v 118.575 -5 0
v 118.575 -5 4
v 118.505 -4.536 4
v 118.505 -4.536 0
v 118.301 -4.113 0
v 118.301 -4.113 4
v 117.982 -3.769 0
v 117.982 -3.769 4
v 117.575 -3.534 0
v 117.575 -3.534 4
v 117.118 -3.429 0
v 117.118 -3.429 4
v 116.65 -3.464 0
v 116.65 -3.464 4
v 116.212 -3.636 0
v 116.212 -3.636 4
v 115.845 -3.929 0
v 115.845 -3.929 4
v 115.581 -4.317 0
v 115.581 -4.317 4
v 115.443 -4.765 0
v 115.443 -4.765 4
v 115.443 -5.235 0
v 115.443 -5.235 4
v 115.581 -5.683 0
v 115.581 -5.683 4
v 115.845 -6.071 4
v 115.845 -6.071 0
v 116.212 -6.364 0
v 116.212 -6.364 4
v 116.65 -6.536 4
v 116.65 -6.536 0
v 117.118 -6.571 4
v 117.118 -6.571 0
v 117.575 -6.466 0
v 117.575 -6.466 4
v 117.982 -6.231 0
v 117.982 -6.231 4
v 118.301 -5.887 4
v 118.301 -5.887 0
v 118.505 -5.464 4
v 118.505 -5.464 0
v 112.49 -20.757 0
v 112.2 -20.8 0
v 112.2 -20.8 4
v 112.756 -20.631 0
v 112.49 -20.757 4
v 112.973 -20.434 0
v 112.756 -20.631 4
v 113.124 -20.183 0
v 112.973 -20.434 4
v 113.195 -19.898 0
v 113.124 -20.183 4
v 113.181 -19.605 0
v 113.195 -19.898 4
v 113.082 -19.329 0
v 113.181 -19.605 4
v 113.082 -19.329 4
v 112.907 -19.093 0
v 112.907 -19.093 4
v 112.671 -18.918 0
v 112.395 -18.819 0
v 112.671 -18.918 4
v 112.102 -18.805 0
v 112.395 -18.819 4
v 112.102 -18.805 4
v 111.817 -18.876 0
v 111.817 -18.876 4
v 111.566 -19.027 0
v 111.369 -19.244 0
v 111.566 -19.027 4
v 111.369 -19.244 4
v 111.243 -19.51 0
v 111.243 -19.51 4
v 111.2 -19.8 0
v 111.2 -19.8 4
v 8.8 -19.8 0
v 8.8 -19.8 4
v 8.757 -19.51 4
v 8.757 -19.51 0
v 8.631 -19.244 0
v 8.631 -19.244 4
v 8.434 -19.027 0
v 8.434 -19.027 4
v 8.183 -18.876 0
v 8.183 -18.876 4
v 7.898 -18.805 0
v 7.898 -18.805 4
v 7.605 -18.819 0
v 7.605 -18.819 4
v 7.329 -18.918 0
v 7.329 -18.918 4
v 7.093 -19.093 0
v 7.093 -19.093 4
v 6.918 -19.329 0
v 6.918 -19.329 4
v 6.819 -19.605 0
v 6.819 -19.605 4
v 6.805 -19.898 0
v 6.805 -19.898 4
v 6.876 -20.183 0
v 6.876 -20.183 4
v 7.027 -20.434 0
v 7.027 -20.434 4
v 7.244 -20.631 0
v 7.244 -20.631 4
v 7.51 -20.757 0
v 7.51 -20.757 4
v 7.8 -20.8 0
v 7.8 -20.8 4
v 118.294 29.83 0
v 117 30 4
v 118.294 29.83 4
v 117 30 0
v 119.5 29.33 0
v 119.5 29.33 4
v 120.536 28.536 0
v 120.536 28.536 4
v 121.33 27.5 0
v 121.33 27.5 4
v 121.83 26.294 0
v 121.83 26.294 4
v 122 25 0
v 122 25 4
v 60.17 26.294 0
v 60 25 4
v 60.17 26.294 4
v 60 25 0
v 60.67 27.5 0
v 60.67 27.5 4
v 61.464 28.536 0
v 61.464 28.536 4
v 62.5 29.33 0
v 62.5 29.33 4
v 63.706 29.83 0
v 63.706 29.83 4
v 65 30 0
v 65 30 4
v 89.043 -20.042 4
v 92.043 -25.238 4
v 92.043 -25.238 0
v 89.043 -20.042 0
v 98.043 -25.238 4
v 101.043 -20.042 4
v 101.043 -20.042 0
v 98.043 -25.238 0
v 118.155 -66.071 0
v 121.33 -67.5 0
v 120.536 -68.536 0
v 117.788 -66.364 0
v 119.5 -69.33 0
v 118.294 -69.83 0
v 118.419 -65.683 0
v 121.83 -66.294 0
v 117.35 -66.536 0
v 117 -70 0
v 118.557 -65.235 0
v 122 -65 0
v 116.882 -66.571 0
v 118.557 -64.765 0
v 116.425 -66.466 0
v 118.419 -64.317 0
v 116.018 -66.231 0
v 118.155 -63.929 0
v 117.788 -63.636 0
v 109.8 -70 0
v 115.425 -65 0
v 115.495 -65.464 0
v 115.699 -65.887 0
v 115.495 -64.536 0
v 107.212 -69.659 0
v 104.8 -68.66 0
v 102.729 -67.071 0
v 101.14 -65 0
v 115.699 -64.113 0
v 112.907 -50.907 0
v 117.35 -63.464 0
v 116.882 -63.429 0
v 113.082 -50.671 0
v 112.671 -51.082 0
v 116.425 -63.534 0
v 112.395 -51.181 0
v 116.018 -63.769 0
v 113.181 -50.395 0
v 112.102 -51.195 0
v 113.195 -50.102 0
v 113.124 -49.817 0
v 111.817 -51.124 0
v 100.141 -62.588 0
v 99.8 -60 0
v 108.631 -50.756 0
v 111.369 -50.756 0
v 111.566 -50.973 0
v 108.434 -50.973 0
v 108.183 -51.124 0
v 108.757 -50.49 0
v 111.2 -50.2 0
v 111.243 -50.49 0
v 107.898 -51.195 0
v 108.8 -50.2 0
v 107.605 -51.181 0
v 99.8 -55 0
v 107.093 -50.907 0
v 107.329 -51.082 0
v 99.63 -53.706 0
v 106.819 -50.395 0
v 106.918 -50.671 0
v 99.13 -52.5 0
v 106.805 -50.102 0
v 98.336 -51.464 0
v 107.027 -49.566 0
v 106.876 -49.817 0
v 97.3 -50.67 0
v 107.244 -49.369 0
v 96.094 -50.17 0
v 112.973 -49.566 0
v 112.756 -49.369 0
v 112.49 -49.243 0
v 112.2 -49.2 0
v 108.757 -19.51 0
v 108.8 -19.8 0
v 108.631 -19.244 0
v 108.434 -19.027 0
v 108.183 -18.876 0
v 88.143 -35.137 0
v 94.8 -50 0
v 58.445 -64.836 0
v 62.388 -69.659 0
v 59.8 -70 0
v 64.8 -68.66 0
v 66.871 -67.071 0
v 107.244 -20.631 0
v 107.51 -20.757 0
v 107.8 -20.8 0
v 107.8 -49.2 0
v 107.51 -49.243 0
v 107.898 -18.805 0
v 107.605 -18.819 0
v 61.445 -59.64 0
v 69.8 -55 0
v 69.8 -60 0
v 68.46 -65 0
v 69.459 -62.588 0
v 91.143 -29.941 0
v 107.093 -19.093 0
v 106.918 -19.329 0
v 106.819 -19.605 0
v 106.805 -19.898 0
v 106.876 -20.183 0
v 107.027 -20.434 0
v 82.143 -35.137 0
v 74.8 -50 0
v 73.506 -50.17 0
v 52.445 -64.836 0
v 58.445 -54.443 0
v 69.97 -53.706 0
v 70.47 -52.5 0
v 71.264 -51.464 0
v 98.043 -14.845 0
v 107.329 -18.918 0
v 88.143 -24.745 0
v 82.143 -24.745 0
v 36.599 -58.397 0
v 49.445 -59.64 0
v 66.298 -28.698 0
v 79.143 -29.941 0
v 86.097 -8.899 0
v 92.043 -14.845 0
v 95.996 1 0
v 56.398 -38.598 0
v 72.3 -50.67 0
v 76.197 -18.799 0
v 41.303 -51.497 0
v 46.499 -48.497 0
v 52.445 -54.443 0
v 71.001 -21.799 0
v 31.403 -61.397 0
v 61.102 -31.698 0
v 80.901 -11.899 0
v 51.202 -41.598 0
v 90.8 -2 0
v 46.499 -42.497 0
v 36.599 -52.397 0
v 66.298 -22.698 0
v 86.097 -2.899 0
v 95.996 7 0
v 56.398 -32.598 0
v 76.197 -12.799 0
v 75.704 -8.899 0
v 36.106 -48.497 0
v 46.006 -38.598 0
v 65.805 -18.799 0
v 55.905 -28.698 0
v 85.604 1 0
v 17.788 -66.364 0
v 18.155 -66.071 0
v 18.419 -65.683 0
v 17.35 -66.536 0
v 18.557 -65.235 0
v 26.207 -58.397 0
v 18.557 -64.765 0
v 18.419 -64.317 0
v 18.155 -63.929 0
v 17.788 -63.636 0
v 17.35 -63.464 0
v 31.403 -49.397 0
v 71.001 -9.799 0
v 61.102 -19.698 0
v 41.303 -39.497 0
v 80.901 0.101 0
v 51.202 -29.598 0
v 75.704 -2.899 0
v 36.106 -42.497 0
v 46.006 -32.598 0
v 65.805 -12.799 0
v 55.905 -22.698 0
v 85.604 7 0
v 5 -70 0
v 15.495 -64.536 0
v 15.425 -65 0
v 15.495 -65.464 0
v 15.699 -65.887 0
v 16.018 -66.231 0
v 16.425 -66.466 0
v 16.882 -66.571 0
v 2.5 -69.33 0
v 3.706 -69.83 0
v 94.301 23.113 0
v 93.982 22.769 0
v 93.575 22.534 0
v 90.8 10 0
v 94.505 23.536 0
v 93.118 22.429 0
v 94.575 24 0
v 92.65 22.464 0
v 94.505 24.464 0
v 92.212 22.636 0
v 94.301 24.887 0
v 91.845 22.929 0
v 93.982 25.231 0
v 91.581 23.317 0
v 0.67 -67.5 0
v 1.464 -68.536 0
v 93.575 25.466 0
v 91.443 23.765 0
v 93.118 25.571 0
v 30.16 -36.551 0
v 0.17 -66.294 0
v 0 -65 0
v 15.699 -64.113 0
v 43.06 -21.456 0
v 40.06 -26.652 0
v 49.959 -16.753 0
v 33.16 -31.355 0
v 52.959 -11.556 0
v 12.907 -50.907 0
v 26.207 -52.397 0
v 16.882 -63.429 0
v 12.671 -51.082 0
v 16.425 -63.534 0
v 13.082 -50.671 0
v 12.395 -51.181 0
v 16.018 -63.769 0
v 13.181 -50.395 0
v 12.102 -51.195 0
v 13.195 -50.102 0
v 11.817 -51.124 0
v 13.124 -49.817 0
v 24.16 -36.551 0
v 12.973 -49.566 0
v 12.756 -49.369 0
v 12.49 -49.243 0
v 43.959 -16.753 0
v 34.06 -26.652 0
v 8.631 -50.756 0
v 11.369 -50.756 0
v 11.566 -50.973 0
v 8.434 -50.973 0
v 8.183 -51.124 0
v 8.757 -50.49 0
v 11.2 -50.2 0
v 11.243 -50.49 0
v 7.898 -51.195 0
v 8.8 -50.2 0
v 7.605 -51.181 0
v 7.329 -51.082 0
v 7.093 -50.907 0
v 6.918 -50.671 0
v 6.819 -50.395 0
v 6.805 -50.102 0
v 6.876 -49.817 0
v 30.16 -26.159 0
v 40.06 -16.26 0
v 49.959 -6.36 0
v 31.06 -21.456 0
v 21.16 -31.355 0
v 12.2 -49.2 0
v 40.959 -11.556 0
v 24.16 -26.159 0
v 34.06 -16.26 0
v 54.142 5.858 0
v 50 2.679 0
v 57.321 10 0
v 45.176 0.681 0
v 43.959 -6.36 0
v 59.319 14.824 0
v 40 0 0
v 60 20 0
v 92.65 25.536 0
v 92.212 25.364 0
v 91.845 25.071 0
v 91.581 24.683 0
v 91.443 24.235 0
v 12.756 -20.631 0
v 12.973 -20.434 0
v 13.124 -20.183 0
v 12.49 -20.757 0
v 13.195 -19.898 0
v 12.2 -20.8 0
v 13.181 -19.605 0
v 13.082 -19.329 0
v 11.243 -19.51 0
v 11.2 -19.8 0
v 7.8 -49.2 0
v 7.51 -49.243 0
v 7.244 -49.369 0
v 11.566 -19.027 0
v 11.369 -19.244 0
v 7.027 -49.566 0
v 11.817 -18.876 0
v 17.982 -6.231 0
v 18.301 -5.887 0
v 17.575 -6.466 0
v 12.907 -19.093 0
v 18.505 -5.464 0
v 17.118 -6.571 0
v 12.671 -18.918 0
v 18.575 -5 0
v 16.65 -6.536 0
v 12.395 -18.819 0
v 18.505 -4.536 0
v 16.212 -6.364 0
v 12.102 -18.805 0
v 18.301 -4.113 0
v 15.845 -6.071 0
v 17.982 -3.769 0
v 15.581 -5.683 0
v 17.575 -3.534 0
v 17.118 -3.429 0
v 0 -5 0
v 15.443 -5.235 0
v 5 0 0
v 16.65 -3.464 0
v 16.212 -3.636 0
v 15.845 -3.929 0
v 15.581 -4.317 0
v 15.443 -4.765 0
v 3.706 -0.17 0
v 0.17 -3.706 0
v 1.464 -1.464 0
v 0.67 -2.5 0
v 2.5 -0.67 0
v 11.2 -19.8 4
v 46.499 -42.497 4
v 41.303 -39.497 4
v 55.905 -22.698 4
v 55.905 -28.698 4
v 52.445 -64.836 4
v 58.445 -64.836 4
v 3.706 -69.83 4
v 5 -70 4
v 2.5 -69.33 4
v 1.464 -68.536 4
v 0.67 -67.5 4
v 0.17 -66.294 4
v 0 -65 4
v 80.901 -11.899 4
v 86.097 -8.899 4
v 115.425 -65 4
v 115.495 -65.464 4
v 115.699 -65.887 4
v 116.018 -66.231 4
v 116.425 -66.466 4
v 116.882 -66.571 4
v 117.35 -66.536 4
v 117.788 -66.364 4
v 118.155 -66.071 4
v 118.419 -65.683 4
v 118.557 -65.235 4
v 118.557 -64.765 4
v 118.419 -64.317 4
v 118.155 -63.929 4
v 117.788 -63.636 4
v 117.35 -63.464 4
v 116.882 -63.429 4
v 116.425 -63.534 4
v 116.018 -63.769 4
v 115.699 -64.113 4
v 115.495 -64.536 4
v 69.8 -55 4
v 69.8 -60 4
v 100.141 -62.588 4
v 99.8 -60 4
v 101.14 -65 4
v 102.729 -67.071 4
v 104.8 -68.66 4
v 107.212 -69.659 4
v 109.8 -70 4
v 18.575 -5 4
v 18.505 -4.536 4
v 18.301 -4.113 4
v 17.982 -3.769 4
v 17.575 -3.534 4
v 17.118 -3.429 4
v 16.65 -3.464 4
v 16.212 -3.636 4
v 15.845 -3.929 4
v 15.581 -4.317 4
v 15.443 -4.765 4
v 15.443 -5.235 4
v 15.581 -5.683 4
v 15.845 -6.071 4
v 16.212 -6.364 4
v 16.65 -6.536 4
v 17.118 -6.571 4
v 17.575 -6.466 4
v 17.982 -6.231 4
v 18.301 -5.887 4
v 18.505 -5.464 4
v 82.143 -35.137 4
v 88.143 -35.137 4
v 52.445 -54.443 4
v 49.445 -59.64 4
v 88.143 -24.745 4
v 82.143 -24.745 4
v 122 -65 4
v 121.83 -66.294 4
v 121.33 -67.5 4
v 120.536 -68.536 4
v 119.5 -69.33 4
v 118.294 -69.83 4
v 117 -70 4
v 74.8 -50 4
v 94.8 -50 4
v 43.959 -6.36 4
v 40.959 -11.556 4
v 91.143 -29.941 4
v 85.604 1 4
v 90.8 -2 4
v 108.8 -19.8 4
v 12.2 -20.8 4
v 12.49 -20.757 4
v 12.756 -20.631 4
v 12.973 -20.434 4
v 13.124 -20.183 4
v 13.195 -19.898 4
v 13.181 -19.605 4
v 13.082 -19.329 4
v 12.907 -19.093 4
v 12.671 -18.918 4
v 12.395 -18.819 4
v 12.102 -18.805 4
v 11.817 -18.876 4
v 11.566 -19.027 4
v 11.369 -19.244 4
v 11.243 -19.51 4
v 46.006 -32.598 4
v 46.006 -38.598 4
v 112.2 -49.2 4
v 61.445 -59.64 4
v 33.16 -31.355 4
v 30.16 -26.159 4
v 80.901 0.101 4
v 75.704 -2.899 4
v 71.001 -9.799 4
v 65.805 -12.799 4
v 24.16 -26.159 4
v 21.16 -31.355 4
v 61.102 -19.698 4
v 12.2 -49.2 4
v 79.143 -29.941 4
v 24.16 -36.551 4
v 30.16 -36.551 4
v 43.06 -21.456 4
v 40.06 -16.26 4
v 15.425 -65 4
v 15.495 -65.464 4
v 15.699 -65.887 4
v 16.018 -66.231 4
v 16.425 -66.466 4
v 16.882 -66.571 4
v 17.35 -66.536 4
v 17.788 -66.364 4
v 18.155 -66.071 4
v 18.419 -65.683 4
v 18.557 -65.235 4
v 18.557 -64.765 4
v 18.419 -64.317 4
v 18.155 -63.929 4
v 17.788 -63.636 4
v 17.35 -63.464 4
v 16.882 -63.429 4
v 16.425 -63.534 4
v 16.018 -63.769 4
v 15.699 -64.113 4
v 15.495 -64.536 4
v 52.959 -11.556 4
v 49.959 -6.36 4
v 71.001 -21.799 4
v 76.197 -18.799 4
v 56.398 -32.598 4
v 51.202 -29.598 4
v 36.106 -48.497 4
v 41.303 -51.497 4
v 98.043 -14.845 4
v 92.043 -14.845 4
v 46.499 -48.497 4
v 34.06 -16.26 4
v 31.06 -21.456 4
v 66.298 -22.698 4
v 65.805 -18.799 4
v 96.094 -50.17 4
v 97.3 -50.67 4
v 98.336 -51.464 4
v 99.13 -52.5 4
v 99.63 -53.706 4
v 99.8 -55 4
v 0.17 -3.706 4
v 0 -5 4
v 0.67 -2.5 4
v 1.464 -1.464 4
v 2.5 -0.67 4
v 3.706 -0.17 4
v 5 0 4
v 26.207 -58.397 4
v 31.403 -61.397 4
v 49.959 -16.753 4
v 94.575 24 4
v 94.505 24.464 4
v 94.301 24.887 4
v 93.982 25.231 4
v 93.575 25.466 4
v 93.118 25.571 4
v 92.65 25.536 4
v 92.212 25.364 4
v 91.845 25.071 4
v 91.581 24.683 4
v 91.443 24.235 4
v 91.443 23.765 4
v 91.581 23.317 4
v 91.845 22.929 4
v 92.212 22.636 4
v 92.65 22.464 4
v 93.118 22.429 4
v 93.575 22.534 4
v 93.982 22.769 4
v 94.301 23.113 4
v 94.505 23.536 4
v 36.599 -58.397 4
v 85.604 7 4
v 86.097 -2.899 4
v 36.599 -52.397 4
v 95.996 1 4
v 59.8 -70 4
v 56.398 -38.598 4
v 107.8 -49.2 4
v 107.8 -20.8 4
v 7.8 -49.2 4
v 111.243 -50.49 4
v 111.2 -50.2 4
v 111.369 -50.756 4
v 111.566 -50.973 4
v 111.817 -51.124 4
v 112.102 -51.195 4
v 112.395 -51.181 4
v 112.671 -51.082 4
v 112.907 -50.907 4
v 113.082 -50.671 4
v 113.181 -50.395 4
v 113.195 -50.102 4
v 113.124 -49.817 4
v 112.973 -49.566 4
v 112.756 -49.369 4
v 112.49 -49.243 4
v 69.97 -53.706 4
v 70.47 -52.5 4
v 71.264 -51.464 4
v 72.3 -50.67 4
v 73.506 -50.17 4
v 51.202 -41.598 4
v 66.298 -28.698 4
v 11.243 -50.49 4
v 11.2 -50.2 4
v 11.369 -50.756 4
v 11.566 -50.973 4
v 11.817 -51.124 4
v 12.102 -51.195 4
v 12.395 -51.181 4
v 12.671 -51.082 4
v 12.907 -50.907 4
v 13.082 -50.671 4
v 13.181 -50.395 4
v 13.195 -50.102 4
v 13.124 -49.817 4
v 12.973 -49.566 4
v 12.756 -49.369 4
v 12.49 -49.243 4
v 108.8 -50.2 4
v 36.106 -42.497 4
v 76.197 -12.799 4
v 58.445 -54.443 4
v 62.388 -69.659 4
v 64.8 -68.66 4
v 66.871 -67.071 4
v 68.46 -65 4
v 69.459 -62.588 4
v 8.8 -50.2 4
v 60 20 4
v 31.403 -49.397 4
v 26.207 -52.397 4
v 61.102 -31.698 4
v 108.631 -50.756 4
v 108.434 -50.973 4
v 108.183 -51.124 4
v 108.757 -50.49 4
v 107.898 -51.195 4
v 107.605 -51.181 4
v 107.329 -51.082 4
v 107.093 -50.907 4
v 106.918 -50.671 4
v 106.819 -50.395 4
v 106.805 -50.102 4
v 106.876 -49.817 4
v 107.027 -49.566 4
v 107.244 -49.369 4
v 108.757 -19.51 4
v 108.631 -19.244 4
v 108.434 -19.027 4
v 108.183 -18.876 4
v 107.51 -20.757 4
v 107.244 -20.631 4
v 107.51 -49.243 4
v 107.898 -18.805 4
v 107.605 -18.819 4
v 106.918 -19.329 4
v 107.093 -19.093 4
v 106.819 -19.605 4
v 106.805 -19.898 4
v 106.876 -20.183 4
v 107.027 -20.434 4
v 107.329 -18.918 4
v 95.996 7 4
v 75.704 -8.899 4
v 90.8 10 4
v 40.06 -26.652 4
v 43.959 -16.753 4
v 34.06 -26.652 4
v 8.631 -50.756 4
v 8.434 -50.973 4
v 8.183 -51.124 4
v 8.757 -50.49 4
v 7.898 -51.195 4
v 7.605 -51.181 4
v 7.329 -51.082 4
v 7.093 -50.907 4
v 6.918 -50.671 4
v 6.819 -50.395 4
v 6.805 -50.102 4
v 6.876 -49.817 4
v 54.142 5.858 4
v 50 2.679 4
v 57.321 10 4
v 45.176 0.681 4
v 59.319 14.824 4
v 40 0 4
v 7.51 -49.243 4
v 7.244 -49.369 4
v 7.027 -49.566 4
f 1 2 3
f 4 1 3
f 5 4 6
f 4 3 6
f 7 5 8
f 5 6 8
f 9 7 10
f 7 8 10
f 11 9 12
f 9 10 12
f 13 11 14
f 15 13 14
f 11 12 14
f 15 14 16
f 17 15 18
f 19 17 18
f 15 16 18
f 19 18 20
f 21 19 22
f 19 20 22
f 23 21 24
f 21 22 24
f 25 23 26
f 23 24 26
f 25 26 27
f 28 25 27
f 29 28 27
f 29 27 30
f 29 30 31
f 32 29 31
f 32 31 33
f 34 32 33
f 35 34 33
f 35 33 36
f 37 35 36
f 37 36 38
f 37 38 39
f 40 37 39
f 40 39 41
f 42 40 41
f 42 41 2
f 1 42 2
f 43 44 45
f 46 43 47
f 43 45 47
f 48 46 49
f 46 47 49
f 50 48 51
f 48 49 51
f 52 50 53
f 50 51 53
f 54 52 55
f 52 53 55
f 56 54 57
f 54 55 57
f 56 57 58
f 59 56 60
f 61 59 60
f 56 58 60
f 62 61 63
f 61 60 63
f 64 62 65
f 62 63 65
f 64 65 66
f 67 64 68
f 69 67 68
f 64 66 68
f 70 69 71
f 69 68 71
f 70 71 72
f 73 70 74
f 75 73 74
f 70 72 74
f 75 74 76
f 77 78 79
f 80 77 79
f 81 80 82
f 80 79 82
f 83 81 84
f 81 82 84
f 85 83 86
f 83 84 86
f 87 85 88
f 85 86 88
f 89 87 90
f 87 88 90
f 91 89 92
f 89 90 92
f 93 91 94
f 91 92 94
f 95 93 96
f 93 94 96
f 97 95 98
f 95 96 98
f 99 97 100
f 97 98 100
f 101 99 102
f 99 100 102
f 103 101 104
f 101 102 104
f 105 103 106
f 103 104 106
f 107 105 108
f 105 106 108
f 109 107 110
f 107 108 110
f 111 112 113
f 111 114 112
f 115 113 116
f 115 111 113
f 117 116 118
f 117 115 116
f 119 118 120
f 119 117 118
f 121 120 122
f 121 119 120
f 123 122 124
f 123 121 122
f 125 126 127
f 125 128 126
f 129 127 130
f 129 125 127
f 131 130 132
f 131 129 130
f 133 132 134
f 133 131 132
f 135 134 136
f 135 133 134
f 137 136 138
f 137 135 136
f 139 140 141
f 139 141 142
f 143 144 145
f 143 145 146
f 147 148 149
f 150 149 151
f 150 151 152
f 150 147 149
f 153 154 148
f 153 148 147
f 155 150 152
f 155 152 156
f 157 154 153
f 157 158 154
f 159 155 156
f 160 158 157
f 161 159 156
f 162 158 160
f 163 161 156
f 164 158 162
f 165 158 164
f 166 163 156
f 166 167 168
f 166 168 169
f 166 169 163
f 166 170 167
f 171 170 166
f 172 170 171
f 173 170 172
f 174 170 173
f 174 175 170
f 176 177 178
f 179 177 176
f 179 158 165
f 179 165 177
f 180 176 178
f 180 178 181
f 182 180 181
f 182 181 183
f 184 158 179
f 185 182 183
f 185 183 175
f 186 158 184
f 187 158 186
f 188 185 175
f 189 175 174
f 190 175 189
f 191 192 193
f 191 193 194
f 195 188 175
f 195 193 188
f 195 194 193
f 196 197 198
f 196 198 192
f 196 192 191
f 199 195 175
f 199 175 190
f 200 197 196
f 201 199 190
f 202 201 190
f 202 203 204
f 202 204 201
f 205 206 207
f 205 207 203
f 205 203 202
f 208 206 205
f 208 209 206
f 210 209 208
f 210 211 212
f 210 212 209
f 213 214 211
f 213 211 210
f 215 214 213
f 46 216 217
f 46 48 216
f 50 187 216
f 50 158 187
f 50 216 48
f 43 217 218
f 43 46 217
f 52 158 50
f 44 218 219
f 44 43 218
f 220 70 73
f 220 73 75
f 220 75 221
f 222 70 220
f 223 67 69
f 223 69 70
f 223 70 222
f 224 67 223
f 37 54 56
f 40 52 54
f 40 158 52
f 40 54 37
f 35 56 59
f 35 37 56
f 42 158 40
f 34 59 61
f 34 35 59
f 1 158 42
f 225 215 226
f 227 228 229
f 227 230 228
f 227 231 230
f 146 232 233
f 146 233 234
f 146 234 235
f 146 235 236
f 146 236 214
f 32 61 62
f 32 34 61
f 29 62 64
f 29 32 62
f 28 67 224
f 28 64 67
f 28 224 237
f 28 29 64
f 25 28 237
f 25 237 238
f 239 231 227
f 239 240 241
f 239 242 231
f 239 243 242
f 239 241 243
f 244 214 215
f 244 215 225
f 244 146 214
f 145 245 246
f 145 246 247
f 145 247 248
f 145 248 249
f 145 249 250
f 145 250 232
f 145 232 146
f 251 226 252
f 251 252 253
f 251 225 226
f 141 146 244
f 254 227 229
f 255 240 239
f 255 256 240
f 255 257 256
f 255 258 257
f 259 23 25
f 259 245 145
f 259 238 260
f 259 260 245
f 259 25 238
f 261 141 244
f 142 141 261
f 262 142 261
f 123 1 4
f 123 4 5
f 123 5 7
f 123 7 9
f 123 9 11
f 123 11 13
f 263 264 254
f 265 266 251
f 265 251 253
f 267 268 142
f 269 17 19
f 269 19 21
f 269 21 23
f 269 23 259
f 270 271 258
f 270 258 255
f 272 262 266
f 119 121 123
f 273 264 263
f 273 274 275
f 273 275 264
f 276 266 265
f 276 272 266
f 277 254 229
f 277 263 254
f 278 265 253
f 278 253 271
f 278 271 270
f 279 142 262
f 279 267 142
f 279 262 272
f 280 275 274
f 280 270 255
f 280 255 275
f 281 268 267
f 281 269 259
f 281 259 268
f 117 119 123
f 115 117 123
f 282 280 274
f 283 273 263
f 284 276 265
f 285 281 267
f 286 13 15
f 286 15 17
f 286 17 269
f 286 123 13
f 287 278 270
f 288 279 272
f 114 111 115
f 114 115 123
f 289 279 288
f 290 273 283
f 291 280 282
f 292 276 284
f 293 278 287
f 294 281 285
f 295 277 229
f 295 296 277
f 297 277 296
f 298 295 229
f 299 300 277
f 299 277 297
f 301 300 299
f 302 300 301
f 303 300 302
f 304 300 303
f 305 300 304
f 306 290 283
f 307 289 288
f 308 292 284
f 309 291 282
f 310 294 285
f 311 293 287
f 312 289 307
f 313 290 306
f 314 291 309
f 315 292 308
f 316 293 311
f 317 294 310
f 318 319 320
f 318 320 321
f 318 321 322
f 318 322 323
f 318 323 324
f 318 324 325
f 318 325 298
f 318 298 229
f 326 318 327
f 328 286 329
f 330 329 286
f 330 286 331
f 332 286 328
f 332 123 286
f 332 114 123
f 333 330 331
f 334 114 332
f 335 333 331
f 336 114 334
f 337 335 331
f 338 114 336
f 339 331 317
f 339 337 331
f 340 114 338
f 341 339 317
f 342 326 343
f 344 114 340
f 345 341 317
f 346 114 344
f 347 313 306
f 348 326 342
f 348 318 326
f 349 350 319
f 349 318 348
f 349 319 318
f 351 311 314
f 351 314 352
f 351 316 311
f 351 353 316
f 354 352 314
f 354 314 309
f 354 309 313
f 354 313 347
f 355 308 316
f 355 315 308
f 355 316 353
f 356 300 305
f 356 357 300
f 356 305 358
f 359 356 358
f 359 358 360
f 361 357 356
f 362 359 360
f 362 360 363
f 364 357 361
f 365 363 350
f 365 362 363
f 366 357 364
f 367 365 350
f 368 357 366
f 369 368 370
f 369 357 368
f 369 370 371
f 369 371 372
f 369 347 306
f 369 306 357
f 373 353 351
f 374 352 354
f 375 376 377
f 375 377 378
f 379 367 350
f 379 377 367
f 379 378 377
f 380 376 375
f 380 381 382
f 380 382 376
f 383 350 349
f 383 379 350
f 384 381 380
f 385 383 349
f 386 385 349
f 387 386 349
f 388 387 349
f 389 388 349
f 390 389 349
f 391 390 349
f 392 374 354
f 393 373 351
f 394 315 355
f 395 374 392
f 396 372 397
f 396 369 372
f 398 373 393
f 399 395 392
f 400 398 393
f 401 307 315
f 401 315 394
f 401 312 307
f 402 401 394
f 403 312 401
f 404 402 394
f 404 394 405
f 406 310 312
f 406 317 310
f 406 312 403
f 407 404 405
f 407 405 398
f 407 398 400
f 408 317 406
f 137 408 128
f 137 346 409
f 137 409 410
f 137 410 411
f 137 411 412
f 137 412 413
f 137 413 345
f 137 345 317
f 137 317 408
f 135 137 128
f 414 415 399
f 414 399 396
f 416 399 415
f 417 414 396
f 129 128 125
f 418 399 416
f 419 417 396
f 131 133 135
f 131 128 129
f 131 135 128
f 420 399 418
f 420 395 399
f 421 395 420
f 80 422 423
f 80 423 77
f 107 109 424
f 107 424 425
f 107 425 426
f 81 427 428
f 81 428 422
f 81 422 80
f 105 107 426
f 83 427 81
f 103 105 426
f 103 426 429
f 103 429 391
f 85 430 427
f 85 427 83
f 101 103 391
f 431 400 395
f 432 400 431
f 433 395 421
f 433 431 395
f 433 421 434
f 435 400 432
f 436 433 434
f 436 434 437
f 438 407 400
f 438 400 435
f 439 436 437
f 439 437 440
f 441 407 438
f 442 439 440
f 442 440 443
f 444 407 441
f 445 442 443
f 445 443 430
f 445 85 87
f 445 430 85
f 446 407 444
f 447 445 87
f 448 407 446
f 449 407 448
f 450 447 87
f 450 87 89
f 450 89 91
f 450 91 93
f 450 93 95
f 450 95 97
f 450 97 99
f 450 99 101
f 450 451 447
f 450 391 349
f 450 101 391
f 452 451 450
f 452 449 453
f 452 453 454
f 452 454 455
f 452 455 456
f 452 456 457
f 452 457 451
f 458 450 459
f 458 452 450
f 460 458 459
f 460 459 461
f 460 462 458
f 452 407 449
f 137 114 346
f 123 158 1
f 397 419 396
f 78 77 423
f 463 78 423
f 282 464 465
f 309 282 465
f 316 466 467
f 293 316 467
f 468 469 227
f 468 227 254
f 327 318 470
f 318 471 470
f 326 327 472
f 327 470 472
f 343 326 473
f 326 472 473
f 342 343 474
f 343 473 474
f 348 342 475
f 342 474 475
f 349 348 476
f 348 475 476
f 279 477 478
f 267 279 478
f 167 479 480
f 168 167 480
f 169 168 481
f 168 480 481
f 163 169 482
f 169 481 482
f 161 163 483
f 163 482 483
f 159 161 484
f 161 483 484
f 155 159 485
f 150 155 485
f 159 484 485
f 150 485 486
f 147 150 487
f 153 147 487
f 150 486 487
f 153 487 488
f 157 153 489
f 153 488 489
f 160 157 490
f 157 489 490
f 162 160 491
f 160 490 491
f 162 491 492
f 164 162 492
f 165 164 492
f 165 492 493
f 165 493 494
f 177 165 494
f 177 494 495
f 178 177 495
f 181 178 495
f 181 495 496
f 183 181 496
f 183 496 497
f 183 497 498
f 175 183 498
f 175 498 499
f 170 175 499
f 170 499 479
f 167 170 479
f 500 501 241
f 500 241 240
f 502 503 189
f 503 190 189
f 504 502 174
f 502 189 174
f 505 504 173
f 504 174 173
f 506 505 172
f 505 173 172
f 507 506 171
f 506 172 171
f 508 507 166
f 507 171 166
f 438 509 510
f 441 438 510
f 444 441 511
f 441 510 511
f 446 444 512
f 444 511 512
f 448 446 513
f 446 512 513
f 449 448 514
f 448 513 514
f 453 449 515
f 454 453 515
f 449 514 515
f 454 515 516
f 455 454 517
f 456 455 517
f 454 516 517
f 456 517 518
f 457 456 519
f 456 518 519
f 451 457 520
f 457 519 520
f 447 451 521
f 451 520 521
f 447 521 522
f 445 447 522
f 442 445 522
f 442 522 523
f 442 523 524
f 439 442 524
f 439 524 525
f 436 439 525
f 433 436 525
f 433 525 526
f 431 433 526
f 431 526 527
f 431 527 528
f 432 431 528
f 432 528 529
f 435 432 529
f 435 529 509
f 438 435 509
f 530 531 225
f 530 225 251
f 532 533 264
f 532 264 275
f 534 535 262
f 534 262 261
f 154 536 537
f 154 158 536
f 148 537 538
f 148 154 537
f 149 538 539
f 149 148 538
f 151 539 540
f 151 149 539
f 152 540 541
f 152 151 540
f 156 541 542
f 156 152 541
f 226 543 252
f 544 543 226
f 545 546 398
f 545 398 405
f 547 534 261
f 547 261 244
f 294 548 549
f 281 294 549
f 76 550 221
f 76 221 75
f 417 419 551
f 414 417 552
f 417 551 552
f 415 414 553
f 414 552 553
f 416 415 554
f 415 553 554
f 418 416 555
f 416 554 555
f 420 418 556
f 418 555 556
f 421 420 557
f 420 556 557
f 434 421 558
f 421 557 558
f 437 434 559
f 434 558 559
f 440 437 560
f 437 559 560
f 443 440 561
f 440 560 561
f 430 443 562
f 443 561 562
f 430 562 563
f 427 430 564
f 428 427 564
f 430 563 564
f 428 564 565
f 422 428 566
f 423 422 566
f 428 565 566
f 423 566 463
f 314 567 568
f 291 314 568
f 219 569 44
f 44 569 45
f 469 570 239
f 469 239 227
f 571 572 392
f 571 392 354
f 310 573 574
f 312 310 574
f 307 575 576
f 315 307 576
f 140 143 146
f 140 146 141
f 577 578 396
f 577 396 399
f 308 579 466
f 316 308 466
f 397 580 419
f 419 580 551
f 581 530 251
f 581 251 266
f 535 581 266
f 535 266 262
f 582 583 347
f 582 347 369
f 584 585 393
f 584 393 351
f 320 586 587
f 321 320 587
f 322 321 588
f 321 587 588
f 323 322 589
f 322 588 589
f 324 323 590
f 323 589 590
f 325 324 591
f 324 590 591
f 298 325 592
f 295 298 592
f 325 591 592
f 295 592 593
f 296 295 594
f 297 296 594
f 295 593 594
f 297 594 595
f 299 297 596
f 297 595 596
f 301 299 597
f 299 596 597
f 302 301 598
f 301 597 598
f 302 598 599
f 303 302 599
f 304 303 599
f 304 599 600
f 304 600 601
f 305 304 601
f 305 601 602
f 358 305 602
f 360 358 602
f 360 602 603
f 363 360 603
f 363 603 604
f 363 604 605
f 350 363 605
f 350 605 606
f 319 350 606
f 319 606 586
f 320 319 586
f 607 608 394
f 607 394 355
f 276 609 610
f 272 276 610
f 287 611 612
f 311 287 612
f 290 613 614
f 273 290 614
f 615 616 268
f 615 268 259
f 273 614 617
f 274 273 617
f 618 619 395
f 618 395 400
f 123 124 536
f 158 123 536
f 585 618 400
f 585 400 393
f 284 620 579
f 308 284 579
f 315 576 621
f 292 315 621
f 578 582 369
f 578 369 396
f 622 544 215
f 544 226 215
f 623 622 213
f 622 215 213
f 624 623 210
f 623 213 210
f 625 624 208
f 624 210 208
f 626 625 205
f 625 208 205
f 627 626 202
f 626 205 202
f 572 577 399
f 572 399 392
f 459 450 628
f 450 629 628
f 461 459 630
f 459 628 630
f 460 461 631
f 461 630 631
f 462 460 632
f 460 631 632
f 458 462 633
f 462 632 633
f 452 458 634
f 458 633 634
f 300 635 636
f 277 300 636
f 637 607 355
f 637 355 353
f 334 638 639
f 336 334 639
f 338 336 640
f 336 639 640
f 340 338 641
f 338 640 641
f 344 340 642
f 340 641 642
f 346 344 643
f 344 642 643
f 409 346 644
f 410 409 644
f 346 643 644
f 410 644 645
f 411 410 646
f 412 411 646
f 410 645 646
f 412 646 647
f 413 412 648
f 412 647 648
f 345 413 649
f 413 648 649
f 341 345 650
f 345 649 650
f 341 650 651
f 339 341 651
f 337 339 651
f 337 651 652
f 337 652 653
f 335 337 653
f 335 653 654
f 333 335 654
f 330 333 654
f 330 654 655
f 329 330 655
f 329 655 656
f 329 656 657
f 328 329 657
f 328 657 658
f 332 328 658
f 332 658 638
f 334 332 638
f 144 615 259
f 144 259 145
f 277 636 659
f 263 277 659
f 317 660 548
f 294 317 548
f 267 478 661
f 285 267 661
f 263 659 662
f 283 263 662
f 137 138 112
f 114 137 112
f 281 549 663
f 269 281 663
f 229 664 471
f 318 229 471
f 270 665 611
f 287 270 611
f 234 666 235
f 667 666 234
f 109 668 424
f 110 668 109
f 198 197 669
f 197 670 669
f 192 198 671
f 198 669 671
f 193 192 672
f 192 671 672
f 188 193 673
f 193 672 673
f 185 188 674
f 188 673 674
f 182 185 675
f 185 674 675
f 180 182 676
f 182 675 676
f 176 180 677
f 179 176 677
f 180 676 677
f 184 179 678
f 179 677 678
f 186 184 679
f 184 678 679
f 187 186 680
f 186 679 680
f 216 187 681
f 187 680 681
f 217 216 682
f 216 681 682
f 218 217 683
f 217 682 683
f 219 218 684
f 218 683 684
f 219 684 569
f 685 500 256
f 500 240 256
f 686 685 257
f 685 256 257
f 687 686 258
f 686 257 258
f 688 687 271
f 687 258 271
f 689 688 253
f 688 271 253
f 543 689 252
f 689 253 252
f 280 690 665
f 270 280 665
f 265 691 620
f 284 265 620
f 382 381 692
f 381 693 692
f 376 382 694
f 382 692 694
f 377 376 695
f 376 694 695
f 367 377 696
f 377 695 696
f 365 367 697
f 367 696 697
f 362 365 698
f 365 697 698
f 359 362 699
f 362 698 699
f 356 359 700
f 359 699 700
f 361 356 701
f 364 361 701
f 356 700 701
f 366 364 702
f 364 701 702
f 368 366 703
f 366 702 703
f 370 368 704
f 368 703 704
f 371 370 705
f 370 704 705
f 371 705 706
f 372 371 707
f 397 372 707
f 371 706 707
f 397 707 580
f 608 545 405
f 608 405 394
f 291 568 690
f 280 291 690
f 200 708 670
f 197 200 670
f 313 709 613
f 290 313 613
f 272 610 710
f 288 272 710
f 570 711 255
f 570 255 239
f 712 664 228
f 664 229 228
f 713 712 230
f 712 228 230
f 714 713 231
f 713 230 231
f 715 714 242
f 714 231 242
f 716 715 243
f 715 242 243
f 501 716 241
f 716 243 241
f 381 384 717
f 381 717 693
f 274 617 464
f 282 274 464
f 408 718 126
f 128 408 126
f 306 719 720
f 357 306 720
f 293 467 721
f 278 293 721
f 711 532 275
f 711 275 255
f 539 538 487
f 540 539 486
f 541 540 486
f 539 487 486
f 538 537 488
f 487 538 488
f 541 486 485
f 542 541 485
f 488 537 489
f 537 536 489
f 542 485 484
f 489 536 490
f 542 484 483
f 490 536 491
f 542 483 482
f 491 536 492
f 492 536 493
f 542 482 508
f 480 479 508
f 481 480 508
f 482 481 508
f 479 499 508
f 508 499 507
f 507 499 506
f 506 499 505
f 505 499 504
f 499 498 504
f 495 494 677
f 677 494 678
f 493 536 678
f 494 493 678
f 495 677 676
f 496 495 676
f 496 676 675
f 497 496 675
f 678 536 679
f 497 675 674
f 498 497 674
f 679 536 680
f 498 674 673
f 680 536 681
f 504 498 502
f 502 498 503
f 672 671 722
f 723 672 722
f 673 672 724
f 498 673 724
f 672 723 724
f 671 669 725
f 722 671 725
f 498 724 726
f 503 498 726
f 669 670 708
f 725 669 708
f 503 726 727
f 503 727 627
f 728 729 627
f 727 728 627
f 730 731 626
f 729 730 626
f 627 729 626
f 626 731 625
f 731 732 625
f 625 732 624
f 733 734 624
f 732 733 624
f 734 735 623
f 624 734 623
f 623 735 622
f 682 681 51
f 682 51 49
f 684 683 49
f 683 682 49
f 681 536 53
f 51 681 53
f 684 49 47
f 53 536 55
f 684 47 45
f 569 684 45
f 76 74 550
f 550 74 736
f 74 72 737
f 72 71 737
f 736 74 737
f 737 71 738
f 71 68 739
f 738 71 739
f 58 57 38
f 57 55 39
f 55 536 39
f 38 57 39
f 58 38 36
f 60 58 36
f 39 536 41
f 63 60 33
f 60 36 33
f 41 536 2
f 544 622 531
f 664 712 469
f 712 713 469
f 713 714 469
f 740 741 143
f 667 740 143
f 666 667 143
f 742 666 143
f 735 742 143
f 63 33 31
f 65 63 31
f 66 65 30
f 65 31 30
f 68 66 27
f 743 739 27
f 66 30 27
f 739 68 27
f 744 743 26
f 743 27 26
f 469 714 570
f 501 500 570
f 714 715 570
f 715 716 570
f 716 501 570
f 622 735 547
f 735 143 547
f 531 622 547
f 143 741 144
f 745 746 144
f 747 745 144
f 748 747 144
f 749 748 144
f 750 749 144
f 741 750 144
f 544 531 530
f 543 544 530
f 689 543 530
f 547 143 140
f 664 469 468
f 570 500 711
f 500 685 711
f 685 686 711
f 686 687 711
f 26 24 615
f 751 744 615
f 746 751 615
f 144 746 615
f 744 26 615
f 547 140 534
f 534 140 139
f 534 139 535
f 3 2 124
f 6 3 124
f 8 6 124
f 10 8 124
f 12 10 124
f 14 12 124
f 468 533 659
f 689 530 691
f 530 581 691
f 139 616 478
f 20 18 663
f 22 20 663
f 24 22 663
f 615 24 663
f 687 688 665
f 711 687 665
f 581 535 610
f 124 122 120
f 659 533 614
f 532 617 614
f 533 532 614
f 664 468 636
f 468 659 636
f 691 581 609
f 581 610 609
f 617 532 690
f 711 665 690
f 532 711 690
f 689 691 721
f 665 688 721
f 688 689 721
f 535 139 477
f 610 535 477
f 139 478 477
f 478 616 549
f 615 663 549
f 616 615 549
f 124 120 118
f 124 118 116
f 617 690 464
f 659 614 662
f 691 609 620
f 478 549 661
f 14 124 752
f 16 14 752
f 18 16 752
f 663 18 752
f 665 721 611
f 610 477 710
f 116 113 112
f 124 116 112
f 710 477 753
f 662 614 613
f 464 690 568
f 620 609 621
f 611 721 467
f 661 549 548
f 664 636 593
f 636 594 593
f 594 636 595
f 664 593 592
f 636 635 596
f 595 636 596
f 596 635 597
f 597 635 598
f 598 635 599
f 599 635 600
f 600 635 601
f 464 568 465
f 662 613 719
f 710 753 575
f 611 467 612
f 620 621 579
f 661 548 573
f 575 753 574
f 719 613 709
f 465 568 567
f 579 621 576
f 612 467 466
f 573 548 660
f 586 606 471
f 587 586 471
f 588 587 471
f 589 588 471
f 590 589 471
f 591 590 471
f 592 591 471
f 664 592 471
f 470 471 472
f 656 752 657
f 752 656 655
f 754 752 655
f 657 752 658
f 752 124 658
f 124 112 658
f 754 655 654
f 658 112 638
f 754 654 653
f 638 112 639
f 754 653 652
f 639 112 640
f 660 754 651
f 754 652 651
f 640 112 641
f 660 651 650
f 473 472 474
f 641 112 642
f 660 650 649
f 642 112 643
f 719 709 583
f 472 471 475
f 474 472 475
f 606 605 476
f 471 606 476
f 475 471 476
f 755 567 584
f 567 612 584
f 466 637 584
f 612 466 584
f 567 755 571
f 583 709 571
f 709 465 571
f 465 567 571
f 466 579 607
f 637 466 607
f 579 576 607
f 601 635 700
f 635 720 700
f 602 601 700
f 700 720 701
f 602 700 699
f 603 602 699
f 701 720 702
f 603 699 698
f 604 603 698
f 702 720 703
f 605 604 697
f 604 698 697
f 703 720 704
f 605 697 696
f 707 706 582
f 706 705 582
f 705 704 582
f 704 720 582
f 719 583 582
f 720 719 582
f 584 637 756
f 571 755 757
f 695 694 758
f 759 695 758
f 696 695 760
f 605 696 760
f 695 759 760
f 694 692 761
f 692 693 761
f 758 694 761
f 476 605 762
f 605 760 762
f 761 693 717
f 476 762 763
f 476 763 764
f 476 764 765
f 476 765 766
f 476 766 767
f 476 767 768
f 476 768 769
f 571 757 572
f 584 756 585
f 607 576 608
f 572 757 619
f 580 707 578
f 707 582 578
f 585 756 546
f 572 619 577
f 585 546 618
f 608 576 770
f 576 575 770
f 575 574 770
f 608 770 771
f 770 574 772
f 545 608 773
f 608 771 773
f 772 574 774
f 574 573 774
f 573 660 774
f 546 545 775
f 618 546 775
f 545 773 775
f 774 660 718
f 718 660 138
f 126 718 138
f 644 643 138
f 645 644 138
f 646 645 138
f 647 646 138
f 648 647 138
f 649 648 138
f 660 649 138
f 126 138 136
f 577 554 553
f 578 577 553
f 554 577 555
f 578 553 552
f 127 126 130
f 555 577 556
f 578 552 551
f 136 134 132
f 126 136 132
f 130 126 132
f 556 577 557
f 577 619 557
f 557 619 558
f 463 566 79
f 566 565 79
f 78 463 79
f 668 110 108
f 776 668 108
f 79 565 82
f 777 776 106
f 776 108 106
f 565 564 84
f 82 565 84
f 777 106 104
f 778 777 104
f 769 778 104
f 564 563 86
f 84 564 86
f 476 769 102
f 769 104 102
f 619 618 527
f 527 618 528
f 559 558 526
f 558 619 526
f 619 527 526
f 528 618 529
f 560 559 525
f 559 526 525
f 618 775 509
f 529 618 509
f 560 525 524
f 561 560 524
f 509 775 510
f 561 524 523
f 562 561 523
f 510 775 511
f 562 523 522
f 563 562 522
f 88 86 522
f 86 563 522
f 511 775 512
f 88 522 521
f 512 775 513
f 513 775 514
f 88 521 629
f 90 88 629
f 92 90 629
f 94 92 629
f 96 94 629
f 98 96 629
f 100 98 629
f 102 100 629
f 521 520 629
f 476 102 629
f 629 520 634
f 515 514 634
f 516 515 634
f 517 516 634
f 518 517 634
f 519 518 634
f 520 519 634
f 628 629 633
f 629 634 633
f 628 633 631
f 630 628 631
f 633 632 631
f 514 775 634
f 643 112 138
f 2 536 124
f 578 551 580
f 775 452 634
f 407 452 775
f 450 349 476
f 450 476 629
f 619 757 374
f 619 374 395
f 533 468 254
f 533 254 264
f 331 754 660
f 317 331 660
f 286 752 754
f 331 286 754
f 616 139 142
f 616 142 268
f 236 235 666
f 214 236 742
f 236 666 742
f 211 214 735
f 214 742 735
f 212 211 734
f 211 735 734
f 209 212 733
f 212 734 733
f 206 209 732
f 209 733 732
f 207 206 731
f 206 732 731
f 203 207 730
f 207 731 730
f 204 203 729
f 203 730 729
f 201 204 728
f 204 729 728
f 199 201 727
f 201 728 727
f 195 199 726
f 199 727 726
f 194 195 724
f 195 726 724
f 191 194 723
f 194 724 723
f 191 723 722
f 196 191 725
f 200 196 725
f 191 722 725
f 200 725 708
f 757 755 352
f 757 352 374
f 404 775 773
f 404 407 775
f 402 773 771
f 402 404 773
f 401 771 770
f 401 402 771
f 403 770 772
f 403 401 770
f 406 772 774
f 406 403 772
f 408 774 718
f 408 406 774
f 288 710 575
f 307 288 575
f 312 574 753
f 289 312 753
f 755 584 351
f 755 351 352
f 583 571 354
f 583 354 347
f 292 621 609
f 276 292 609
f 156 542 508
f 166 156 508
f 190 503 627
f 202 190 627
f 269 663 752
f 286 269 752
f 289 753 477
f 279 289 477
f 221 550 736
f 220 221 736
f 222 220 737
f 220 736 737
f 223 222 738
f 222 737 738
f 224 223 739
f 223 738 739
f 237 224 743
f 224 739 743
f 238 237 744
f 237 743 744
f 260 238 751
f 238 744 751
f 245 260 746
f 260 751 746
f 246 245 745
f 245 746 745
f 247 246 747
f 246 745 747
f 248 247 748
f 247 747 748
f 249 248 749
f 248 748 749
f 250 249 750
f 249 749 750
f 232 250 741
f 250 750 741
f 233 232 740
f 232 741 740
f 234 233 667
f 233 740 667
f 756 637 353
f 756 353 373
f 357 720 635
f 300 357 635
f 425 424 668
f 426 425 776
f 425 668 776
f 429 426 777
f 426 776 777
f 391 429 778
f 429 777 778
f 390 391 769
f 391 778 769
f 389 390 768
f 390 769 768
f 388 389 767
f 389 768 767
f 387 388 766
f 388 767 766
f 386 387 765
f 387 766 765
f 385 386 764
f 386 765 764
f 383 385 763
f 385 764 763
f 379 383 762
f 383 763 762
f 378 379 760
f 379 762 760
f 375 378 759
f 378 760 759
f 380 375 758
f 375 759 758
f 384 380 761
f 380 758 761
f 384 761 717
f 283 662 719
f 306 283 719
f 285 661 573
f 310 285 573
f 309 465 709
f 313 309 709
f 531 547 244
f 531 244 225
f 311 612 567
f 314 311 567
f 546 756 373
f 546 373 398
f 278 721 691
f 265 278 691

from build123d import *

# Parameters (mm, degrees)
SKETCH_1_W          = 120
SKETCH_1_H          = 70
EXTRUDE_1_DEPTH     = 4
SKETCH_2_W          = 4.4
SKETCH_2_H          = 30.4
CUT_EXTRUDE_1_DEPTH = 139.982013225
SKETCH_3_R          = 1
SKETCH_3_R_2        = 1.575
CUT_EXTRUDE_2_DEPTH = 139.982013225
EXTRUDE_2_DEPTH     = 4
SKETCH_5_R          = 1.575
SKETCH_5_W          = 30
SKETCH_5_H          = 20
CUT_EXTRUDE_3_DEPTH = 141.712472795
FILLET_1_R          = 10
FILLET_2_R          = 5
FILLET_3_R          = 20


with BuildPart() as part:
    # 草图1 → 凸台-拉伸1 (new body)
    with BuildSketch(Plane.XY):
        with Locations((60, -35)):
            Rectangle(SKETCH_1_W, SKETCH_1_H)
    extrude(amount=EXTRUDE_1_DEPTH)

    # 草图2 → 切除-拉伸1 (cut, through all)
    with BuildSketch(Plane.XY.offset(4)):
        with Locations((10, -35)):
            Rectangle(SKETCH_2_W, SKETCH_2_H)
        with Locations((110, -35)):
            Rectangle(SKETCH_2_W, SKETCH_2_H)
    extrude(amount=-CUT_EXTRUDE_1_DEPTH, mode=Mode.SUBTRACT)

    # 草图3 → 切除-拉伸2 (cut, through all)
    with BuildSketch(Plane.XY.offset(4)):
        with Locations((7.8, -19.8)):
            Circle(SKETCH_3_R)
        with Locations((12.2, -19.8)):
            Circle(SKETCH_3_R)
        with Locations((7.8, -50.2)):
            Circle(SKETCH_3_R)
        with Locations((12.2, -50.2)):
            Circle(SKETCH_3_R)
        with Locations((107.8, -19.8)):
            Circle(SKETCH_3_R)
        with Locations((107.8, -50.2)):
            Circle(SKETCH_3_R)
        with Locations((112.2, -50.2)):
            Circle(SKETCH_3_R)
        with Locations((112.2, -19.8)):
            Circle(SKETCH_3_R)
        with Locations((17, -5)):
            Circle(SKETCH_3_R_2)
        with Locations(Location((17, -65, 0), (0, 0, 180))):
            Circle(SKETCH_3_R_2)
        with Locations((117, -5)):
            Circle(SKETCH_3_R_2)
        with Locations(Location((117, -65, 0), (0, 0, 180))):
            Circle(SKETCH_3_R_2)
    extrude(amount=-CUT_EXTRUDE_2_DEPTH, mode=Mode.SUBTRACT)

    # 草图4 → 凸台-拉伸2 (add)
    with BuildSketch(Plane.XY.offset(4)):
        Polygon((60, 0), (60, 30), (122, 30), (122, -70), (120, -70), (120, 0), align=None)
    extrude(amount=-EXTRUDE_2_DEPTH)

    # 草图5 → 切除-拉伸3 (cut, through all)
    with BuildSketch(Plane.XY.offset(4)):
        with Locations((93, 24)):
            Circle(SKETCH_5_R)
        with Locations((84.8, -60)):
            Rectangle(SKETCH_5_W, SKETCH_5_H)
        Polygon((90.8, -2), (95.996152423, 1), (95.996152423, 7), (90.8, 10), (85.603847577, 7), (85.603847577, 1), align=None)
        Polygon((86.096657486, -2.899494937), (80.900505063, 0.100505063), (75.704352641, -2.899494937), (75.704352641, -8.899494937), (80.900505063, -11.899494937), (86.096657486, -8.899494937), align=None)
        Polygon((76.197162549, -12.798989873), (71.001010127, -9.798989873), (65.804857704, -12.798989873), (65.804857704, -18.798989873), (71.001010127, -21.798989873), (76.197162549, -18.798989873), align=None)
        Polygon((66.297667613, -22.69848481), (61.10151519, -19.69848481), (55.905362767, -22.69848481), (55.905362767, -28.69848481), (61.10151519, -31.69848481), (66.297667613, -28.69848481), align=None)
        Polygon((56.398172676, -32.597979746), (51.202020254, -29.597979746), (46.005867831, -32.597979746), (46.005867831, -38.597979746), (51.202020254, -41.597979746), (56.398172676, -38.597979746), align=None)
        Polygon((46.49867774, -42.497474683), (41.302525317, -39.497474683), (36.106372894, -42.497474683), (36.106372894, -48.497474683), (41.302525317, -51.497474683), (46.49867774, -48.497474683), align=None)
        Polygon((36.599182803, -52.39696962), (31.40303038, -49.39696962), (26.206877958, -52.39696962), (26.206877958, -58.39696962), (31.40303038, -61.39696962), (36.599182803, -58.39696962), align=None)
        Polygon((91.143145751, -29.941125497), (88.143145751, -35.13727792), (82.143145751, -35.13727792), (79.143145751, -29.941125497), (82.143145751, -24.744973074), (88.143145751, -24.744973074), align=None)
        Polygon((101.042640687, -20.04163056), (98.042640687, -25.237782983), (92.042640687, -25.237782983), (89.042640687, -20.04163056), (92.042640687, -14.845478138), (98.042640687, -14.845478138), align=None)
        Polygon((61.444660941, -59.639610307), (58.444660941, -64.835762729), (52.444660941, -64.835762729), (49.444660941, -59.639610307), (52.444660941, -54.443457884), (58.444660941, -54.443457884), align=None)
        Polygon((31.05988463, -21.455844123), (34.05988463, -16.2596917), (40.05988463, -16.2596917), (43.05988463, -21.455844123), (40.05988463, -26.651996545), (34.05988463, -26.651996545), align=None)
        Polygon((30.160389693, -36.551491482), (24.160389693, -36.551491482), (21.160389693, -31.355339059), (24.160389693, -26.159186637), (30.160389693, -26.159186637), (33.160389693, -31.355339059), align=None)
        Polygon((43.959379566, -16.752501609), (40.959379566, -11.556349186), (43.959379566, -6.360196763), (49.959379566, -6.360196763), (52.959379566, -11.556349186), (49.959379566, -16.752501609), align=None)
    extrude(amount=-CUT_EXTRUDE_3_DEPTH, mode=Mode.SUBTRACT)

    # 圆角1
    fillet_1_edges = [part.edges().sort_by_distance(p)[0] for p in [
        (69.8, -70, 2),
        (99.8, -70, 2),
    ]]
    fillet(fillet_1_edges, radius=FILLET_1_R)

    # 圆角2
    fillet_2_edges = [part.edges().sort_by_distance(p)[0] for p in [
        (60, 30, 2),
        (122, 30, 2),
        (122, -70, 2),
        (69.8, -50, 2),
        (99.8, -50, 2),
        (0, 0, 2),
        (0, -70, 2),
    ]]
    fillet(fillet_2_edges, radius=FILLET_2_R)

    # 圆角3
    fillet_3_edges = [part.edges().sort_by_distance(p)[0] for p in [
        (60, 0, 2),
    ]]
    fillet(fillet_3_edges, radius=FILLET_3_R)


solid = part.part
